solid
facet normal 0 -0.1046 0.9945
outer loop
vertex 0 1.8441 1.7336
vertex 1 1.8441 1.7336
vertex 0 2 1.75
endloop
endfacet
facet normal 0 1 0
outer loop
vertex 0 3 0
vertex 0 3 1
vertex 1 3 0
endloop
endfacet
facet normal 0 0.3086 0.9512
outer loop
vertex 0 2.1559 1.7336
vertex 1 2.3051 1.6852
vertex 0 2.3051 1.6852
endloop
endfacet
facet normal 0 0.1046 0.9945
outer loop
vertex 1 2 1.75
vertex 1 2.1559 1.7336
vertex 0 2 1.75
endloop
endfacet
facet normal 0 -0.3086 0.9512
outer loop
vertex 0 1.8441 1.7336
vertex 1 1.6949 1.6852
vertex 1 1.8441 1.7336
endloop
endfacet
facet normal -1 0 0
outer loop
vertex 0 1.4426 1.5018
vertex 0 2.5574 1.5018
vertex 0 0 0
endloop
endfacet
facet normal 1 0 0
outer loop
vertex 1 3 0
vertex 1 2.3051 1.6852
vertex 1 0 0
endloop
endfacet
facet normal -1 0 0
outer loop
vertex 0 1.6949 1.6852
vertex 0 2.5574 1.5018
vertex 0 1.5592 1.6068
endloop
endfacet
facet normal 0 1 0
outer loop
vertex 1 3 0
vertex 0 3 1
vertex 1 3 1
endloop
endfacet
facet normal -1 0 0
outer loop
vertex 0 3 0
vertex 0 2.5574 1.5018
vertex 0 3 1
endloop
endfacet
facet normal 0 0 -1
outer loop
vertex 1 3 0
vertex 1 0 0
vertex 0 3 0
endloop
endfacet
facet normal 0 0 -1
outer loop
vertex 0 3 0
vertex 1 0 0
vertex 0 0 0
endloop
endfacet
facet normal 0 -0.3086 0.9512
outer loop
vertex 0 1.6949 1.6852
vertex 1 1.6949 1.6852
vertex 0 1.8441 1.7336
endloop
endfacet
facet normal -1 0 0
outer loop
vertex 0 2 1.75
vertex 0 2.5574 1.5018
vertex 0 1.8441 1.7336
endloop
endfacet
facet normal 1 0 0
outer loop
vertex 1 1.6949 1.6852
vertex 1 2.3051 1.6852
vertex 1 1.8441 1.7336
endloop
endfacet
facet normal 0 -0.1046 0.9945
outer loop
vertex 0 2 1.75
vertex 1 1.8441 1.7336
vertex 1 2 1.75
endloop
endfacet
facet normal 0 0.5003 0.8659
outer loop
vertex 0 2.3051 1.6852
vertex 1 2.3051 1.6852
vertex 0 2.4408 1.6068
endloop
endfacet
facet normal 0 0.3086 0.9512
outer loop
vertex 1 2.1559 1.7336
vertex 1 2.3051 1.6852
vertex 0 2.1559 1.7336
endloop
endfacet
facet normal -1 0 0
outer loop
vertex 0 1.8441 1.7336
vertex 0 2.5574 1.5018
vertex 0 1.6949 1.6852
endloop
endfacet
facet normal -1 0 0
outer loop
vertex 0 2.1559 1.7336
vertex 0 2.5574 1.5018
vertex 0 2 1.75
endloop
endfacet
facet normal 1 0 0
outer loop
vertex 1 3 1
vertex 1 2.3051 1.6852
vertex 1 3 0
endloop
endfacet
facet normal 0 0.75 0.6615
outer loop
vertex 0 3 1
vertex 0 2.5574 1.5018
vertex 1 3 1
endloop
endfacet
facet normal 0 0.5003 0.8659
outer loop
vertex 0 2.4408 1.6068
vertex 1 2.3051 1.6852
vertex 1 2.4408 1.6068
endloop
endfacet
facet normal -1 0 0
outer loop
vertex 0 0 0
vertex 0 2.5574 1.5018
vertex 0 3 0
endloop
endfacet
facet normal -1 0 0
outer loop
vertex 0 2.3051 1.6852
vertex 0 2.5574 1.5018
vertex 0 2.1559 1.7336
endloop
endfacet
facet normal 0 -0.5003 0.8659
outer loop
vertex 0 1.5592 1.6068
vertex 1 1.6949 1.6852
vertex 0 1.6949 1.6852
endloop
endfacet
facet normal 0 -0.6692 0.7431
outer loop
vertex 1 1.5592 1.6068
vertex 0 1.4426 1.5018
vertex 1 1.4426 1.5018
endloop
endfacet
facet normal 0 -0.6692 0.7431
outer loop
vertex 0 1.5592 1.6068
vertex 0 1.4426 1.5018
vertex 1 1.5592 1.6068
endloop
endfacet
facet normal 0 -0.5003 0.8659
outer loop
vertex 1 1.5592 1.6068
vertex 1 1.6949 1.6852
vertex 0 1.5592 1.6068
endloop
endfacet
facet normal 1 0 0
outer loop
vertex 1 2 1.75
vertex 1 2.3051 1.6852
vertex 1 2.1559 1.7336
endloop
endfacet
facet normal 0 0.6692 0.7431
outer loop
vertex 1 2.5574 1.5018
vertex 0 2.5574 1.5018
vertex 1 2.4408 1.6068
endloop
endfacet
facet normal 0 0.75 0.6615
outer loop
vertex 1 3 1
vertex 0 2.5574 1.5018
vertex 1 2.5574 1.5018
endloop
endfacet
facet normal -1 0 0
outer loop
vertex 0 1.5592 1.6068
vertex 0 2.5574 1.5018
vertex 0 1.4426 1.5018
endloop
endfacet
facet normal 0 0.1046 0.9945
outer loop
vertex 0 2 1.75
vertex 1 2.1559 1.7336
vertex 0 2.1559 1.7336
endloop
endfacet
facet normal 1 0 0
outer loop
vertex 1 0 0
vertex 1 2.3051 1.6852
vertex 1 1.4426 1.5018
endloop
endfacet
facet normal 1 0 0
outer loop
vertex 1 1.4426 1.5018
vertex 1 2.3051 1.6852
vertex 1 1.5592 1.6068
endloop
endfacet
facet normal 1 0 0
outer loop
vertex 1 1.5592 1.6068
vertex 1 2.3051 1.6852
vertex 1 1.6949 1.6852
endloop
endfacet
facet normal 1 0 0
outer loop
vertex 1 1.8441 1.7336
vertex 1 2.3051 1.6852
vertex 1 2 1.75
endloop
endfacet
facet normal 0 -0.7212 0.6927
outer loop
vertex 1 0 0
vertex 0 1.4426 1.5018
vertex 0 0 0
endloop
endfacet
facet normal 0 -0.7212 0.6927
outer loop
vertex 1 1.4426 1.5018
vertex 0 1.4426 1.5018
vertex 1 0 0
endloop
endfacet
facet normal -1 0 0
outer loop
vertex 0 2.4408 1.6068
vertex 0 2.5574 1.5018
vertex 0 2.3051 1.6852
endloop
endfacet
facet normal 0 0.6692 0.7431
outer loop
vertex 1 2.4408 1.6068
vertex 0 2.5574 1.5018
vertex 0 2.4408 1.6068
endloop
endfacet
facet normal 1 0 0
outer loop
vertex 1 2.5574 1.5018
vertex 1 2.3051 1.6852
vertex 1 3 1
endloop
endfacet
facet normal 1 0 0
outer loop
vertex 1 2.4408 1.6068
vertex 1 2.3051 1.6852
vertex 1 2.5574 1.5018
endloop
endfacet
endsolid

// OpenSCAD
// file: hull.scad
/*
hull.scad - a library that leverages the hull() procedure
Author: Elliot Williams
github: https://gist.github.com/hexagon5un )
source: https://gist.github.com/hexagon5un/73e187dfa0404c69177795424f397ce6#file-hull-scad

Featured in the hackaday atricle: 'OPENSCAD: TIEING IT TOGETHER WITH HULL()'
https://hackaday.com/2018/02/13/openscad-tieing-it-together-with-hull/
*/
module multiHull(){
	for (i = [1 : $children-1])
		hull(){
			children(0);
			children(i);
		}
}

module sequentialHull(){
	for (i = [0: $children-2])
		hull(){
			children(i);
			children(i+1);
		}
}

/* Extended fun hull functions */ 

module cylinders(points, diameter, thickness){
	for (p=points){
		translate(p) cylinder(d=diameter, h=thickness, center=true);
	}
}

module plate(points, diameter, thickness, hole_diameter){
	difference(){
		hull() cylinders(points, diameter, thickness);
		cylinders(points, hole_diameter, 1000);
	}
}

module bar(length, width, thickness, hole_diameter){
	plate([[0,0,0], [length,0,0]], width, thickness, hole_diameter);
}

module rounded_box(points, radius, height, facets=30){
	hull(){
		for (p = points){
			translate(p)
				cylinder(r=radius, h=height, $fn=facets);
		}
	}
}

module point_cloud(points, radius=1, facets=8){
	for (p=points){
		translate(p)
			sphere(radius/cos(180/facets), $fn=facets);
		// polygon sphere circumscribed on radius
	}
}

module point_hull(points, radius=1, facets=8){
	hull(){
		point_cloud(points, radius, facets);
	}
}

// Shrink the exterior of the points so that the hull fits inside
function select(vector, i) = [ for (p=vector) p[i] ];
function axis_center(v, i) = (max(select(v, i)) - min(select(v,i)))/2;
function center(v) = [ for (i = [0,1,2]) axis_center(v, i) ];
function shrink_point(point, center, radius) = [ for (i = [0,1,2]) point[i] > center[i] ? point[i] - radius : point[i] + radius ]; 
function shrink(points, radius) = [ for (p = points) shrink_point(p, center(points), radius) ];

module interior_point_hull(points, radius=1){
	point_hull(shrink(points, radius), radius);
}

module interior_rounded_box(points, radius, height){
	rounded_box(shrink(points, radius), radius, height);
}


module mirror_copy(v = [1, 0, 0]) {
    children();
    mirror(v) children();
}
// file: basics.scad
///< Basics module
use <math.scad>;
use <utils.scad>;
use <hull.scad>;

module triangle( w, d, h ){
     difference(){
	  hyp = hyp_from_sides( d, h );
	  color( "red" )cube( [w, d, h] );
	  rotate( [ 45, 0, 0 ] )
	       translate( [ -0.01, 0, 0 ] )
	       color( "green" )cube( [w+0.2, hyp, h] );
     }
}

module tri_xy(pt1, pt2, pt3, h=1) {
     color( rands( 0,1,3 ) ) linear_extrude( height=h )
	  polygon( points=[ pt1, pt2, pt3 ] );
}

module triangle_xy( pts, h=1) {
     color( rands( 0,1,3 ) ) linear_extrude( height=h )
	  polygon( points = pts );
}

module oval(w,l, height, center = false, fn = 30) {
 scale([1, l/w, 1]) cylinder(h=height, r=w, center=center, $fn = fn);
}

module pipe( outer, inner, height, fn = 60 ){
     offset_percent = 0.25;
     inner_h = height + (offset_percent * 2 );
     difference(){
     ///< Debug with union(){
	  cylinder(r=outer, h = height, $fn = fn );
	  translate([0,0,-offset_percent]){
	       color("green",0.5)cylinder(r=inner, h = inner_h, $fn = fn );
	  }
     }
}

module rounded_pipe( r, h, fn = 60 ){
     cylinder(r = r, h = h, $fn = fn );

     color("blue")
     translate([0,0,h])
	  sphere(r, $fn = fn );

     color("red")
     translate([0,0,0])
	  sphere(r, $fn = fn );
}

/// Stackoverflow example module for a line
/// https://stackoverflow.com/questions/49533350/is-that-possible-to-draw-a-line-using-openscad-by-joining-different-points
module line(start, end, thickness = 1, fn = 30) {
    hull() {
	translate(start) sphere(thickness, $fn = fn);
	translate(end) sphere(thickness, $fn = fn);
    }
}


/*
Hulled box:

Parameterized box with rounded corners. This uses the hull.scad
to hull four cylinders around four point in space. This variation
offsets the box to zero/zero and takes in w,d,h to mesh better
with tuples.
*/
module hulled_cube( w, d, h, r = 1 ){
    points = [
	[ 0, 0, 0 ],
	[ w, 0, 0 ],
	[ 0, w, 0 ],
	[ w, w, 0 ],
	];
    resize( [w,d,h]){
	translate( [r, r,0] ){
	    rounded_box( points, radius = r, height=h );
	}
    }
}
// file: utils.scad
///< Utilities

function rand_clr() = rands( 0,1,3 );

///< Length conversions
function in2mm( i ) = ( i * 25.4 ); 
function mm2in( m ) = ( m / 25.4 );

/// This is pulled from stackoverflow
/// https://stackoverflow.com/questions/45826208/openscad-rotating-around-a-particular-point

// rotate as per a, v, but around point pt
module rotate_about_pt(a, v, pt) {
    translate(pt)
        rotate(a,v)
            translate(-pt)
                children();   
}
// file: math.scad
///< Math scad module


///< Find the hypotenuse from two sides of a right triangle
function hyp_from_sides( a, b ) = sqrt( pow( a, 2 ) + pow( b, 2 ) );

///< Find equal sides from hypotenuse of a right triangle
function sides_from_hyp(h) = sqrt( pow( h, 2 ) / 2 );

///< Find A from hypotenuse and B
function a_from_hb( h, b ) = sqrt( pow( h, 2 ) - pow( b, 2 ) );

function dist_2d( pt2, pt1 ) = sqrt(pow(( pt2[0]-pt1[0] ),2) + pow(( pt2[1]-pt1[1]),2) );

function mid_pt_2d( pt2, pt1 ) = [( pt1[0]+pt2[0] )/2, ( pt1[1]+pt2[1] )/2, 0 ];
///< Test for math functions

A = 3;
B = 4;
echo("Given A=", A, "and B=", B );
H = hyp_from_sides( A, B );
echo("Hypotenuse=", H );
echo("Calc Correct = ", (H == 5) );

echo("Given H=", H, " which is a hypotenuse with equal sides" );
echo( "the sides=", sides_from_hyp( H ) );

echo("Given H=", H, "B=", 4 );
echo("A=", a_from_hb( H, 4 ) );

echo("Distance from [-1,1] and [3,4] = ", dist_2d( [-1,1],[3,4]) );
// main file
///< Object definition
use <math.scad>;
use <utils.scad>;
use <basics.scad>;
///< Parameters
h = 1;
w = 1;
d = 1;

///< Modules
module clip( w, d, h, over_hang = 0 ){
     cube( [w, d, h] );
     translate( [ 0, -over_hang, h ] )
	  triangle( w, d+over_hang, h+over_hang );
}


module rclip( w, d, h, over_hang = 0 ){
     hull()
     {
     translate( [ 0, d*2, h ] )rotate( [0, 90, 0] )cylinder( d = h*1.5, h = d, $fn = 30 );
     triangle( w, d, h );
     translate( [ 0, d, 0 ] )color( "purple")cube( [ w, d*2, h ] );
     }
}
///< Build clip

rclip( w, d, h, 1  );
